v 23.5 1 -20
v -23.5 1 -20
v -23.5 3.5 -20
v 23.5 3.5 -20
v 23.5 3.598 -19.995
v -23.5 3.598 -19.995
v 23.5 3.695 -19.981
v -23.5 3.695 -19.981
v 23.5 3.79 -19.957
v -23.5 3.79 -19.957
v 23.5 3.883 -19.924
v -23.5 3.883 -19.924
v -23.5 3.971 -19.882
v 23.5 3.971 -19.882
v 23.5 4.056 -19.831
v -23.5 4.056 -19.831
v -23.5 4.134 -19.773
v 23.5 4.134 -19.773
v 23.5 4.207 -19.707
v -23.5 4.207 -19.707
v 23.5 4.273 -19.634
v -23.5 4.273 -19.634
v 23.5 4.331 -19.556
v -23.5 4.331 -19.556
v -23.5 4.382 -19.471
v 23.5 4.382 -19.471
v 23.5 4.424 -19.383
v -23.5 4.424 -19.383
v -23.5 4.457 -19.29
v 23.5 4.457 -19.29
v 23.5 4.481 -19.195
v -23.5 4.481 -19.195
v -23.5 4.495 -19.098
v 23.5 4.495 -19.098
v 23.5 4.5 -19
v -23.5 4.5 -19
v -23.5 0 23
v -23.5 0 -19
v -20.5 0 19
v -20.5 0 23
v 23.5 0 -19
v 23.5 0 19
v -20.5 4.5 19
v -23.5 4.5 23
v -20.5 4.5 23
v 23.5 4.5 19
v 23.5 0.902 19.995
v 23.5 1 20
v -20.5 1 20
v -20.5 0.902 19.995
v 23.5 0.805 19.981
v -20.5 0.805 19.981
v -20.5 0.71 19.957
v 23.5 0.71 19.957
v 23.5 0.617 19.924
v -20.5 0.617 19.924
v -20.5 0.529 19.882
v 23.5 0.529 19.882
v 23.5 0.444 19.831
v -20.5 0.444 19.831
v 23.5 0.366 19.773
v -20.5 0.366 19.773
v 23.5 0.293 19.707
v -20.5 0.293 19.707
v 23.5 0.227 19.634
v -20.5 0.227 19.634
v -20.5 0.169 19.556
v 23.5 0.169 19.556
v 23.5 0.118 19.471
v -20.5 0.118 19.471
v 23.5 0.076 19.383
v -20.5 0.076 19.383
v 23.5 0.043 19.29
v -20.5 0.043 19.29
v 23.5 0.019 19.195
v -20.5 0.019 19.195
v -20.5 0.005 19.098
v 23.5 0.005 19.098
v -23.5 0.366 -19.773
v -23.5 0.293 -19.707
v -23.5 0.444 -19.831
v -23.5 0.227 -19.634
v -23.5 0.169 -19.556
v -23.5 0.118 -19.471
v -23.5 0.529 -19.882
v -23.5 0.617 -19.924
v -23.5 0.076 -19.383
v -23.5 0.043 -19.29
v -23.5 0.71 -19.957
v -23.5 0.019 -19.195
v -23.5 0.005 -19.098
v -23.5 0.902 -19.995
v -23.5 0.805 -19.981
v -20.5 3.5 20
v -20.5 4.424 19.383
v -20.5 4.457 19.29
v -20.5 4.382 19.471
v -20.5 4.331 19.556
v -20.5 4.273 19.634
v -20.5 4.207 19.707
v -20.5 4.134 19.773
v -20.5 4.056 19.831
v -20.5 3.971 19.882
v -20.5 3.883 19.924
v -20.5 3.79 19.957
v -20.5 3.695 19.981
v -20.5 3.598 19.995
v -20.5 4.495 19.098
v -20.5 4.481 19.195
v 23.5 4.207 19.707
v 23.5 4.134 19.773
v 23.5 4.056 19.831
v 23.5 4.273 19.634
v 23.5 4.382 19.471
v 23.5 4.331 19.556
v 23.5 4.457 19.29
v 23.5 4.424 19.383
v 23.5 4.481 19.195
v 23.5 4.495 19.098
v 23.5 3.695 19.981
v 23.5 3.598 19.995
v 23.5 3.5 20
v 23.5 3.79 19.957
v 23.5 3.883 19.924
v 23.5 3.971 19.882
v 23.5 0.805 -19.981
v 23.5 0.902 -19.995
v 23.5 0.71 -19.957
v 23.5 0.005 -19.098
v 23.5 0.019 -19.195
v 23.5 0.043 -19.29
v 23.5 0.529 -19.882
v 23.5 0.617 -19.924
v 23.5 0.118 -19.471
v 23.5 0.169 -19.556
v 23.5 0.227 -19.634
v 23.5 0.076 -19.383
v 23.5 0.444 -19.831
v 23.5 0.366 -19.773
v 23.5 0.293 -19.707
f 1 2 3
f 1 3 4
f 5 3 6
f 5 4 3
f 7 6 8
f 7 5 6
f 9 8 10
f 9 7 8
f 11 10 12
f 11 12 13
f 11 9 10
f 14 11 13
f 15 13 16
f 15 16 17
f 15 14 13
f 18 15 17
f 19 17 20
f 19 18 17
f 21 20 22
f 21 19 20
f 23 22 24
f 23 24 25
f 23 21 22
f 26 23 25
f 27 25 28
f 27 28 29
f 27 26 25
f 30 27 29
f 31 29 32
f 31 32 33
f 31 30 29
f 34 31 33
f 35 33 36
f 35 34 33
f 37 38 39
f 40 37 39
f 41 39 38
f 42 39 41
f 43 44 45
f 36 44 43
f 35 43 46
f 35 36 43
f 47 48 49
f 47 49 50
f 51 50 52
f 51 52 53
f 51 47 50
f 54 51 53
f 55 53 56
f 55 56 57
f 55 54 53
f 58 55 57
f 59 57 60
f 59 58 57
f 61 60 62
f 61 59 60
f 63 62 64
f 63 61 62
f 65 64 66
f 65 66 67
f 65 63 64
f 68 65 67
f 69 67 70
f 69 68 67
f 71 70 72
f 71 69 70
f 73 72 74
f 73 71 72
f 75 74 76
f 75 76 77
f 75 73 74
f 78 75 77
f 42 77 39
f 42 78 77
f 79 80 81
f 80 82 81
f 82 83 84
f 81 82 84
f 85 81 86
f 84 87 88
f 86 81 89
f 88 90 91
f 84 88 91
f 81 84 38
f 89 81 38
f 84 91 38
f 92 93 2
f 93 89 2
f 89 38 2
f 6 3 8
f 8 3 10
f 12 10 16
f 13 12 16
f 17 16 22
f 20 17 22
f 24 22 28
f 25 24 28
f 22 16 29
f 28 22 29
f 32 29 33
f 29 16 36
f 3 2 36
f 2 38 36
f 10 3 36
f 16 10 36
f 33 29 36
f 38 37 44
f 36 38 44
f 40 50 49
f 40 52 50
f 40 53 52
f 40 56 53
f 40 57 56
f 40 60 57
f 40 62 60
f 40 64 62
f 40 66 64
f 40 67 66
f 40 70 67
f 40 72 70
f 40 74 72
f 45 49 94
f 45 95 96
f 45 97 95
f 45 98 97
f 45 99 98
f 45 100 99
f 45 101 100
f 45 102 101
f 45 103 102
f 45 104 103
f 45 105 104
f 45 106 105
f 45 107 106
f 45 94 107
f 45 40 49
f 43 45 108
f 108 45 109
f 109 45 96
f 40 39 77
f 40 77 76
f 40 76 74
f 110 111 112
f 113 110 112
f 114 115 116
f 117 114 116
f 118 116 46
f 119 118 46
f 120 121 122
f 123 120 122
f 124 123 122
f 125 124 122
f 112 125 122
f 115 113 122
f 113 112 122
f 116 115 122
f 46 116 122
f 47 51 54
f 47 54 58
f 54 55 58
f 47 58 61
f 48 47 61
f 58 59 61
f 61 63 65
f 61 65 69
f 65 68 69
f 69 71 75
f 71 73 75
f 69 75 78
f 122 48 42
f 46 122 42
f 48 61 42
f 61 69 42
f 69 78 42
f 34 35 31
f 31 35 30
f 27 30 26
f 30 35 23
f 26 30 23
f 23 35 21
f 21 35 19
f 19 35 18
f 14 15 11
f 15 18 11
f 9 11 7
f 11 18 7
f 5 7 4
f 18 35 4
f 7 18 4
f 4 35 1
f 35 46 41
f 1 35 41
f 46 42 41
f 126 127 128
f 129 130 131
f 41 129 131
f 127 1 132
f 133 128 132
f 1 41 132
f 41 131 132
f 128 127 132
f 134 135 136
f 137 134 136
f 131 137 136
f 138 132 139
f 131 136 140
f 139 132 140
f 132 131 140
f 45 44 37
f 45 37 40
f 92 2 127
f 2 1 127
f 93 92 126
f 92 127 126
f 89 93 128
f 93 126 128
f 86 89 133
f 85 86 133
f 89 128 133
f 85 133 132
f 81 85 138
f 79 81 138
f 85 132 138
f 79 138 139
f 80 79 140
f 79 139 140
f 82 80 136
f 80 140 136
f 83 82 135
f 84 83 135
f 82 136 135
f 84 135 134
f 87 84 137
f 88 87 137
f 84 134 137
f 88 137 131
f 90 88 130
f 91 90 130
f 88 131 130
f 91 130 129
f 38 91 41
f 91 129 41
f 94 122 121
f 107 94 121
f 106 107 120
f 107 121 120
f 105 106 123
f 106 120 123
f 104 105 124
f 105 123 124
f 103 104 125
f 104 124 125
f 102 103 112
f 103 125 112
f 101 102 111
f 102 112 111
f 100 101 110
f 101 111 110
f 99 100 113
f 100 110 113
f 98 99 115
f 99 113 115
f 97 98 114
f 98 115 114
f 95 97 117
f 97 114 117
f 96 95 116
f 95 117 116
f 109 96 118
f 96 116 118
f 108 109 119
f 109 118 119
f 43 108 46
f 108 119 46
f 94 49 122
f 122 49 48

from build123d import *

# Parameters (mm, degrees)
SKETCH1_W                = 47
SKETCH1_H                = 40
BOSS_EXTRUDE1_DEPTH      = 4.5
FILLET1_R                = 1
SKETCH2_W                = 3
SKETCH2_H                = 4.5
BOSS_EXTRUDE2_DEPTH      = 3
BOSS_EXTRUDE2_DEPTH_BACK = 3


with BuildPart() as part:
    # Sketch1 → Boss-Extrude1 (new body)
    with BuildSketch(Plane(origin=(0, 0, 0), x_dir=(1, 0, 0), z_dir=(0, 1, 0))):
        Rectangle(SKETCH1_W, SKETCH1_H)
    extrude(amount=BOSS_EXTRUDE1_DEPTH)

    # Fillet1
    fillet1_edges = [part.edges().sort_by_distance(p)[0] for p in [
        (0, 4.5, -20),
        (0, 0, -20),
        (0, 0, 20),
        (0, 4.5, 20),
    ]]
    fillet(fillet1_edges, radius=FILLET1_R)

    # Sketch2 → Boss-Extrude2 (add, two sides)
    with BuildSketch(Plane.XY.offset(20)) as boss_extrude2_sk:
        with Locations((-22, 2.25)):
            Rectangle(SKETCH2_W, SKETCH2_H)
    extrude(amount=BOSS_EXTRUDE2_DEPTH)
    extrude(boss_extrude2_sk.sketch, amount=-BOSS_EXTRUDE2_DEPTH_BACK)


solid = part.part
